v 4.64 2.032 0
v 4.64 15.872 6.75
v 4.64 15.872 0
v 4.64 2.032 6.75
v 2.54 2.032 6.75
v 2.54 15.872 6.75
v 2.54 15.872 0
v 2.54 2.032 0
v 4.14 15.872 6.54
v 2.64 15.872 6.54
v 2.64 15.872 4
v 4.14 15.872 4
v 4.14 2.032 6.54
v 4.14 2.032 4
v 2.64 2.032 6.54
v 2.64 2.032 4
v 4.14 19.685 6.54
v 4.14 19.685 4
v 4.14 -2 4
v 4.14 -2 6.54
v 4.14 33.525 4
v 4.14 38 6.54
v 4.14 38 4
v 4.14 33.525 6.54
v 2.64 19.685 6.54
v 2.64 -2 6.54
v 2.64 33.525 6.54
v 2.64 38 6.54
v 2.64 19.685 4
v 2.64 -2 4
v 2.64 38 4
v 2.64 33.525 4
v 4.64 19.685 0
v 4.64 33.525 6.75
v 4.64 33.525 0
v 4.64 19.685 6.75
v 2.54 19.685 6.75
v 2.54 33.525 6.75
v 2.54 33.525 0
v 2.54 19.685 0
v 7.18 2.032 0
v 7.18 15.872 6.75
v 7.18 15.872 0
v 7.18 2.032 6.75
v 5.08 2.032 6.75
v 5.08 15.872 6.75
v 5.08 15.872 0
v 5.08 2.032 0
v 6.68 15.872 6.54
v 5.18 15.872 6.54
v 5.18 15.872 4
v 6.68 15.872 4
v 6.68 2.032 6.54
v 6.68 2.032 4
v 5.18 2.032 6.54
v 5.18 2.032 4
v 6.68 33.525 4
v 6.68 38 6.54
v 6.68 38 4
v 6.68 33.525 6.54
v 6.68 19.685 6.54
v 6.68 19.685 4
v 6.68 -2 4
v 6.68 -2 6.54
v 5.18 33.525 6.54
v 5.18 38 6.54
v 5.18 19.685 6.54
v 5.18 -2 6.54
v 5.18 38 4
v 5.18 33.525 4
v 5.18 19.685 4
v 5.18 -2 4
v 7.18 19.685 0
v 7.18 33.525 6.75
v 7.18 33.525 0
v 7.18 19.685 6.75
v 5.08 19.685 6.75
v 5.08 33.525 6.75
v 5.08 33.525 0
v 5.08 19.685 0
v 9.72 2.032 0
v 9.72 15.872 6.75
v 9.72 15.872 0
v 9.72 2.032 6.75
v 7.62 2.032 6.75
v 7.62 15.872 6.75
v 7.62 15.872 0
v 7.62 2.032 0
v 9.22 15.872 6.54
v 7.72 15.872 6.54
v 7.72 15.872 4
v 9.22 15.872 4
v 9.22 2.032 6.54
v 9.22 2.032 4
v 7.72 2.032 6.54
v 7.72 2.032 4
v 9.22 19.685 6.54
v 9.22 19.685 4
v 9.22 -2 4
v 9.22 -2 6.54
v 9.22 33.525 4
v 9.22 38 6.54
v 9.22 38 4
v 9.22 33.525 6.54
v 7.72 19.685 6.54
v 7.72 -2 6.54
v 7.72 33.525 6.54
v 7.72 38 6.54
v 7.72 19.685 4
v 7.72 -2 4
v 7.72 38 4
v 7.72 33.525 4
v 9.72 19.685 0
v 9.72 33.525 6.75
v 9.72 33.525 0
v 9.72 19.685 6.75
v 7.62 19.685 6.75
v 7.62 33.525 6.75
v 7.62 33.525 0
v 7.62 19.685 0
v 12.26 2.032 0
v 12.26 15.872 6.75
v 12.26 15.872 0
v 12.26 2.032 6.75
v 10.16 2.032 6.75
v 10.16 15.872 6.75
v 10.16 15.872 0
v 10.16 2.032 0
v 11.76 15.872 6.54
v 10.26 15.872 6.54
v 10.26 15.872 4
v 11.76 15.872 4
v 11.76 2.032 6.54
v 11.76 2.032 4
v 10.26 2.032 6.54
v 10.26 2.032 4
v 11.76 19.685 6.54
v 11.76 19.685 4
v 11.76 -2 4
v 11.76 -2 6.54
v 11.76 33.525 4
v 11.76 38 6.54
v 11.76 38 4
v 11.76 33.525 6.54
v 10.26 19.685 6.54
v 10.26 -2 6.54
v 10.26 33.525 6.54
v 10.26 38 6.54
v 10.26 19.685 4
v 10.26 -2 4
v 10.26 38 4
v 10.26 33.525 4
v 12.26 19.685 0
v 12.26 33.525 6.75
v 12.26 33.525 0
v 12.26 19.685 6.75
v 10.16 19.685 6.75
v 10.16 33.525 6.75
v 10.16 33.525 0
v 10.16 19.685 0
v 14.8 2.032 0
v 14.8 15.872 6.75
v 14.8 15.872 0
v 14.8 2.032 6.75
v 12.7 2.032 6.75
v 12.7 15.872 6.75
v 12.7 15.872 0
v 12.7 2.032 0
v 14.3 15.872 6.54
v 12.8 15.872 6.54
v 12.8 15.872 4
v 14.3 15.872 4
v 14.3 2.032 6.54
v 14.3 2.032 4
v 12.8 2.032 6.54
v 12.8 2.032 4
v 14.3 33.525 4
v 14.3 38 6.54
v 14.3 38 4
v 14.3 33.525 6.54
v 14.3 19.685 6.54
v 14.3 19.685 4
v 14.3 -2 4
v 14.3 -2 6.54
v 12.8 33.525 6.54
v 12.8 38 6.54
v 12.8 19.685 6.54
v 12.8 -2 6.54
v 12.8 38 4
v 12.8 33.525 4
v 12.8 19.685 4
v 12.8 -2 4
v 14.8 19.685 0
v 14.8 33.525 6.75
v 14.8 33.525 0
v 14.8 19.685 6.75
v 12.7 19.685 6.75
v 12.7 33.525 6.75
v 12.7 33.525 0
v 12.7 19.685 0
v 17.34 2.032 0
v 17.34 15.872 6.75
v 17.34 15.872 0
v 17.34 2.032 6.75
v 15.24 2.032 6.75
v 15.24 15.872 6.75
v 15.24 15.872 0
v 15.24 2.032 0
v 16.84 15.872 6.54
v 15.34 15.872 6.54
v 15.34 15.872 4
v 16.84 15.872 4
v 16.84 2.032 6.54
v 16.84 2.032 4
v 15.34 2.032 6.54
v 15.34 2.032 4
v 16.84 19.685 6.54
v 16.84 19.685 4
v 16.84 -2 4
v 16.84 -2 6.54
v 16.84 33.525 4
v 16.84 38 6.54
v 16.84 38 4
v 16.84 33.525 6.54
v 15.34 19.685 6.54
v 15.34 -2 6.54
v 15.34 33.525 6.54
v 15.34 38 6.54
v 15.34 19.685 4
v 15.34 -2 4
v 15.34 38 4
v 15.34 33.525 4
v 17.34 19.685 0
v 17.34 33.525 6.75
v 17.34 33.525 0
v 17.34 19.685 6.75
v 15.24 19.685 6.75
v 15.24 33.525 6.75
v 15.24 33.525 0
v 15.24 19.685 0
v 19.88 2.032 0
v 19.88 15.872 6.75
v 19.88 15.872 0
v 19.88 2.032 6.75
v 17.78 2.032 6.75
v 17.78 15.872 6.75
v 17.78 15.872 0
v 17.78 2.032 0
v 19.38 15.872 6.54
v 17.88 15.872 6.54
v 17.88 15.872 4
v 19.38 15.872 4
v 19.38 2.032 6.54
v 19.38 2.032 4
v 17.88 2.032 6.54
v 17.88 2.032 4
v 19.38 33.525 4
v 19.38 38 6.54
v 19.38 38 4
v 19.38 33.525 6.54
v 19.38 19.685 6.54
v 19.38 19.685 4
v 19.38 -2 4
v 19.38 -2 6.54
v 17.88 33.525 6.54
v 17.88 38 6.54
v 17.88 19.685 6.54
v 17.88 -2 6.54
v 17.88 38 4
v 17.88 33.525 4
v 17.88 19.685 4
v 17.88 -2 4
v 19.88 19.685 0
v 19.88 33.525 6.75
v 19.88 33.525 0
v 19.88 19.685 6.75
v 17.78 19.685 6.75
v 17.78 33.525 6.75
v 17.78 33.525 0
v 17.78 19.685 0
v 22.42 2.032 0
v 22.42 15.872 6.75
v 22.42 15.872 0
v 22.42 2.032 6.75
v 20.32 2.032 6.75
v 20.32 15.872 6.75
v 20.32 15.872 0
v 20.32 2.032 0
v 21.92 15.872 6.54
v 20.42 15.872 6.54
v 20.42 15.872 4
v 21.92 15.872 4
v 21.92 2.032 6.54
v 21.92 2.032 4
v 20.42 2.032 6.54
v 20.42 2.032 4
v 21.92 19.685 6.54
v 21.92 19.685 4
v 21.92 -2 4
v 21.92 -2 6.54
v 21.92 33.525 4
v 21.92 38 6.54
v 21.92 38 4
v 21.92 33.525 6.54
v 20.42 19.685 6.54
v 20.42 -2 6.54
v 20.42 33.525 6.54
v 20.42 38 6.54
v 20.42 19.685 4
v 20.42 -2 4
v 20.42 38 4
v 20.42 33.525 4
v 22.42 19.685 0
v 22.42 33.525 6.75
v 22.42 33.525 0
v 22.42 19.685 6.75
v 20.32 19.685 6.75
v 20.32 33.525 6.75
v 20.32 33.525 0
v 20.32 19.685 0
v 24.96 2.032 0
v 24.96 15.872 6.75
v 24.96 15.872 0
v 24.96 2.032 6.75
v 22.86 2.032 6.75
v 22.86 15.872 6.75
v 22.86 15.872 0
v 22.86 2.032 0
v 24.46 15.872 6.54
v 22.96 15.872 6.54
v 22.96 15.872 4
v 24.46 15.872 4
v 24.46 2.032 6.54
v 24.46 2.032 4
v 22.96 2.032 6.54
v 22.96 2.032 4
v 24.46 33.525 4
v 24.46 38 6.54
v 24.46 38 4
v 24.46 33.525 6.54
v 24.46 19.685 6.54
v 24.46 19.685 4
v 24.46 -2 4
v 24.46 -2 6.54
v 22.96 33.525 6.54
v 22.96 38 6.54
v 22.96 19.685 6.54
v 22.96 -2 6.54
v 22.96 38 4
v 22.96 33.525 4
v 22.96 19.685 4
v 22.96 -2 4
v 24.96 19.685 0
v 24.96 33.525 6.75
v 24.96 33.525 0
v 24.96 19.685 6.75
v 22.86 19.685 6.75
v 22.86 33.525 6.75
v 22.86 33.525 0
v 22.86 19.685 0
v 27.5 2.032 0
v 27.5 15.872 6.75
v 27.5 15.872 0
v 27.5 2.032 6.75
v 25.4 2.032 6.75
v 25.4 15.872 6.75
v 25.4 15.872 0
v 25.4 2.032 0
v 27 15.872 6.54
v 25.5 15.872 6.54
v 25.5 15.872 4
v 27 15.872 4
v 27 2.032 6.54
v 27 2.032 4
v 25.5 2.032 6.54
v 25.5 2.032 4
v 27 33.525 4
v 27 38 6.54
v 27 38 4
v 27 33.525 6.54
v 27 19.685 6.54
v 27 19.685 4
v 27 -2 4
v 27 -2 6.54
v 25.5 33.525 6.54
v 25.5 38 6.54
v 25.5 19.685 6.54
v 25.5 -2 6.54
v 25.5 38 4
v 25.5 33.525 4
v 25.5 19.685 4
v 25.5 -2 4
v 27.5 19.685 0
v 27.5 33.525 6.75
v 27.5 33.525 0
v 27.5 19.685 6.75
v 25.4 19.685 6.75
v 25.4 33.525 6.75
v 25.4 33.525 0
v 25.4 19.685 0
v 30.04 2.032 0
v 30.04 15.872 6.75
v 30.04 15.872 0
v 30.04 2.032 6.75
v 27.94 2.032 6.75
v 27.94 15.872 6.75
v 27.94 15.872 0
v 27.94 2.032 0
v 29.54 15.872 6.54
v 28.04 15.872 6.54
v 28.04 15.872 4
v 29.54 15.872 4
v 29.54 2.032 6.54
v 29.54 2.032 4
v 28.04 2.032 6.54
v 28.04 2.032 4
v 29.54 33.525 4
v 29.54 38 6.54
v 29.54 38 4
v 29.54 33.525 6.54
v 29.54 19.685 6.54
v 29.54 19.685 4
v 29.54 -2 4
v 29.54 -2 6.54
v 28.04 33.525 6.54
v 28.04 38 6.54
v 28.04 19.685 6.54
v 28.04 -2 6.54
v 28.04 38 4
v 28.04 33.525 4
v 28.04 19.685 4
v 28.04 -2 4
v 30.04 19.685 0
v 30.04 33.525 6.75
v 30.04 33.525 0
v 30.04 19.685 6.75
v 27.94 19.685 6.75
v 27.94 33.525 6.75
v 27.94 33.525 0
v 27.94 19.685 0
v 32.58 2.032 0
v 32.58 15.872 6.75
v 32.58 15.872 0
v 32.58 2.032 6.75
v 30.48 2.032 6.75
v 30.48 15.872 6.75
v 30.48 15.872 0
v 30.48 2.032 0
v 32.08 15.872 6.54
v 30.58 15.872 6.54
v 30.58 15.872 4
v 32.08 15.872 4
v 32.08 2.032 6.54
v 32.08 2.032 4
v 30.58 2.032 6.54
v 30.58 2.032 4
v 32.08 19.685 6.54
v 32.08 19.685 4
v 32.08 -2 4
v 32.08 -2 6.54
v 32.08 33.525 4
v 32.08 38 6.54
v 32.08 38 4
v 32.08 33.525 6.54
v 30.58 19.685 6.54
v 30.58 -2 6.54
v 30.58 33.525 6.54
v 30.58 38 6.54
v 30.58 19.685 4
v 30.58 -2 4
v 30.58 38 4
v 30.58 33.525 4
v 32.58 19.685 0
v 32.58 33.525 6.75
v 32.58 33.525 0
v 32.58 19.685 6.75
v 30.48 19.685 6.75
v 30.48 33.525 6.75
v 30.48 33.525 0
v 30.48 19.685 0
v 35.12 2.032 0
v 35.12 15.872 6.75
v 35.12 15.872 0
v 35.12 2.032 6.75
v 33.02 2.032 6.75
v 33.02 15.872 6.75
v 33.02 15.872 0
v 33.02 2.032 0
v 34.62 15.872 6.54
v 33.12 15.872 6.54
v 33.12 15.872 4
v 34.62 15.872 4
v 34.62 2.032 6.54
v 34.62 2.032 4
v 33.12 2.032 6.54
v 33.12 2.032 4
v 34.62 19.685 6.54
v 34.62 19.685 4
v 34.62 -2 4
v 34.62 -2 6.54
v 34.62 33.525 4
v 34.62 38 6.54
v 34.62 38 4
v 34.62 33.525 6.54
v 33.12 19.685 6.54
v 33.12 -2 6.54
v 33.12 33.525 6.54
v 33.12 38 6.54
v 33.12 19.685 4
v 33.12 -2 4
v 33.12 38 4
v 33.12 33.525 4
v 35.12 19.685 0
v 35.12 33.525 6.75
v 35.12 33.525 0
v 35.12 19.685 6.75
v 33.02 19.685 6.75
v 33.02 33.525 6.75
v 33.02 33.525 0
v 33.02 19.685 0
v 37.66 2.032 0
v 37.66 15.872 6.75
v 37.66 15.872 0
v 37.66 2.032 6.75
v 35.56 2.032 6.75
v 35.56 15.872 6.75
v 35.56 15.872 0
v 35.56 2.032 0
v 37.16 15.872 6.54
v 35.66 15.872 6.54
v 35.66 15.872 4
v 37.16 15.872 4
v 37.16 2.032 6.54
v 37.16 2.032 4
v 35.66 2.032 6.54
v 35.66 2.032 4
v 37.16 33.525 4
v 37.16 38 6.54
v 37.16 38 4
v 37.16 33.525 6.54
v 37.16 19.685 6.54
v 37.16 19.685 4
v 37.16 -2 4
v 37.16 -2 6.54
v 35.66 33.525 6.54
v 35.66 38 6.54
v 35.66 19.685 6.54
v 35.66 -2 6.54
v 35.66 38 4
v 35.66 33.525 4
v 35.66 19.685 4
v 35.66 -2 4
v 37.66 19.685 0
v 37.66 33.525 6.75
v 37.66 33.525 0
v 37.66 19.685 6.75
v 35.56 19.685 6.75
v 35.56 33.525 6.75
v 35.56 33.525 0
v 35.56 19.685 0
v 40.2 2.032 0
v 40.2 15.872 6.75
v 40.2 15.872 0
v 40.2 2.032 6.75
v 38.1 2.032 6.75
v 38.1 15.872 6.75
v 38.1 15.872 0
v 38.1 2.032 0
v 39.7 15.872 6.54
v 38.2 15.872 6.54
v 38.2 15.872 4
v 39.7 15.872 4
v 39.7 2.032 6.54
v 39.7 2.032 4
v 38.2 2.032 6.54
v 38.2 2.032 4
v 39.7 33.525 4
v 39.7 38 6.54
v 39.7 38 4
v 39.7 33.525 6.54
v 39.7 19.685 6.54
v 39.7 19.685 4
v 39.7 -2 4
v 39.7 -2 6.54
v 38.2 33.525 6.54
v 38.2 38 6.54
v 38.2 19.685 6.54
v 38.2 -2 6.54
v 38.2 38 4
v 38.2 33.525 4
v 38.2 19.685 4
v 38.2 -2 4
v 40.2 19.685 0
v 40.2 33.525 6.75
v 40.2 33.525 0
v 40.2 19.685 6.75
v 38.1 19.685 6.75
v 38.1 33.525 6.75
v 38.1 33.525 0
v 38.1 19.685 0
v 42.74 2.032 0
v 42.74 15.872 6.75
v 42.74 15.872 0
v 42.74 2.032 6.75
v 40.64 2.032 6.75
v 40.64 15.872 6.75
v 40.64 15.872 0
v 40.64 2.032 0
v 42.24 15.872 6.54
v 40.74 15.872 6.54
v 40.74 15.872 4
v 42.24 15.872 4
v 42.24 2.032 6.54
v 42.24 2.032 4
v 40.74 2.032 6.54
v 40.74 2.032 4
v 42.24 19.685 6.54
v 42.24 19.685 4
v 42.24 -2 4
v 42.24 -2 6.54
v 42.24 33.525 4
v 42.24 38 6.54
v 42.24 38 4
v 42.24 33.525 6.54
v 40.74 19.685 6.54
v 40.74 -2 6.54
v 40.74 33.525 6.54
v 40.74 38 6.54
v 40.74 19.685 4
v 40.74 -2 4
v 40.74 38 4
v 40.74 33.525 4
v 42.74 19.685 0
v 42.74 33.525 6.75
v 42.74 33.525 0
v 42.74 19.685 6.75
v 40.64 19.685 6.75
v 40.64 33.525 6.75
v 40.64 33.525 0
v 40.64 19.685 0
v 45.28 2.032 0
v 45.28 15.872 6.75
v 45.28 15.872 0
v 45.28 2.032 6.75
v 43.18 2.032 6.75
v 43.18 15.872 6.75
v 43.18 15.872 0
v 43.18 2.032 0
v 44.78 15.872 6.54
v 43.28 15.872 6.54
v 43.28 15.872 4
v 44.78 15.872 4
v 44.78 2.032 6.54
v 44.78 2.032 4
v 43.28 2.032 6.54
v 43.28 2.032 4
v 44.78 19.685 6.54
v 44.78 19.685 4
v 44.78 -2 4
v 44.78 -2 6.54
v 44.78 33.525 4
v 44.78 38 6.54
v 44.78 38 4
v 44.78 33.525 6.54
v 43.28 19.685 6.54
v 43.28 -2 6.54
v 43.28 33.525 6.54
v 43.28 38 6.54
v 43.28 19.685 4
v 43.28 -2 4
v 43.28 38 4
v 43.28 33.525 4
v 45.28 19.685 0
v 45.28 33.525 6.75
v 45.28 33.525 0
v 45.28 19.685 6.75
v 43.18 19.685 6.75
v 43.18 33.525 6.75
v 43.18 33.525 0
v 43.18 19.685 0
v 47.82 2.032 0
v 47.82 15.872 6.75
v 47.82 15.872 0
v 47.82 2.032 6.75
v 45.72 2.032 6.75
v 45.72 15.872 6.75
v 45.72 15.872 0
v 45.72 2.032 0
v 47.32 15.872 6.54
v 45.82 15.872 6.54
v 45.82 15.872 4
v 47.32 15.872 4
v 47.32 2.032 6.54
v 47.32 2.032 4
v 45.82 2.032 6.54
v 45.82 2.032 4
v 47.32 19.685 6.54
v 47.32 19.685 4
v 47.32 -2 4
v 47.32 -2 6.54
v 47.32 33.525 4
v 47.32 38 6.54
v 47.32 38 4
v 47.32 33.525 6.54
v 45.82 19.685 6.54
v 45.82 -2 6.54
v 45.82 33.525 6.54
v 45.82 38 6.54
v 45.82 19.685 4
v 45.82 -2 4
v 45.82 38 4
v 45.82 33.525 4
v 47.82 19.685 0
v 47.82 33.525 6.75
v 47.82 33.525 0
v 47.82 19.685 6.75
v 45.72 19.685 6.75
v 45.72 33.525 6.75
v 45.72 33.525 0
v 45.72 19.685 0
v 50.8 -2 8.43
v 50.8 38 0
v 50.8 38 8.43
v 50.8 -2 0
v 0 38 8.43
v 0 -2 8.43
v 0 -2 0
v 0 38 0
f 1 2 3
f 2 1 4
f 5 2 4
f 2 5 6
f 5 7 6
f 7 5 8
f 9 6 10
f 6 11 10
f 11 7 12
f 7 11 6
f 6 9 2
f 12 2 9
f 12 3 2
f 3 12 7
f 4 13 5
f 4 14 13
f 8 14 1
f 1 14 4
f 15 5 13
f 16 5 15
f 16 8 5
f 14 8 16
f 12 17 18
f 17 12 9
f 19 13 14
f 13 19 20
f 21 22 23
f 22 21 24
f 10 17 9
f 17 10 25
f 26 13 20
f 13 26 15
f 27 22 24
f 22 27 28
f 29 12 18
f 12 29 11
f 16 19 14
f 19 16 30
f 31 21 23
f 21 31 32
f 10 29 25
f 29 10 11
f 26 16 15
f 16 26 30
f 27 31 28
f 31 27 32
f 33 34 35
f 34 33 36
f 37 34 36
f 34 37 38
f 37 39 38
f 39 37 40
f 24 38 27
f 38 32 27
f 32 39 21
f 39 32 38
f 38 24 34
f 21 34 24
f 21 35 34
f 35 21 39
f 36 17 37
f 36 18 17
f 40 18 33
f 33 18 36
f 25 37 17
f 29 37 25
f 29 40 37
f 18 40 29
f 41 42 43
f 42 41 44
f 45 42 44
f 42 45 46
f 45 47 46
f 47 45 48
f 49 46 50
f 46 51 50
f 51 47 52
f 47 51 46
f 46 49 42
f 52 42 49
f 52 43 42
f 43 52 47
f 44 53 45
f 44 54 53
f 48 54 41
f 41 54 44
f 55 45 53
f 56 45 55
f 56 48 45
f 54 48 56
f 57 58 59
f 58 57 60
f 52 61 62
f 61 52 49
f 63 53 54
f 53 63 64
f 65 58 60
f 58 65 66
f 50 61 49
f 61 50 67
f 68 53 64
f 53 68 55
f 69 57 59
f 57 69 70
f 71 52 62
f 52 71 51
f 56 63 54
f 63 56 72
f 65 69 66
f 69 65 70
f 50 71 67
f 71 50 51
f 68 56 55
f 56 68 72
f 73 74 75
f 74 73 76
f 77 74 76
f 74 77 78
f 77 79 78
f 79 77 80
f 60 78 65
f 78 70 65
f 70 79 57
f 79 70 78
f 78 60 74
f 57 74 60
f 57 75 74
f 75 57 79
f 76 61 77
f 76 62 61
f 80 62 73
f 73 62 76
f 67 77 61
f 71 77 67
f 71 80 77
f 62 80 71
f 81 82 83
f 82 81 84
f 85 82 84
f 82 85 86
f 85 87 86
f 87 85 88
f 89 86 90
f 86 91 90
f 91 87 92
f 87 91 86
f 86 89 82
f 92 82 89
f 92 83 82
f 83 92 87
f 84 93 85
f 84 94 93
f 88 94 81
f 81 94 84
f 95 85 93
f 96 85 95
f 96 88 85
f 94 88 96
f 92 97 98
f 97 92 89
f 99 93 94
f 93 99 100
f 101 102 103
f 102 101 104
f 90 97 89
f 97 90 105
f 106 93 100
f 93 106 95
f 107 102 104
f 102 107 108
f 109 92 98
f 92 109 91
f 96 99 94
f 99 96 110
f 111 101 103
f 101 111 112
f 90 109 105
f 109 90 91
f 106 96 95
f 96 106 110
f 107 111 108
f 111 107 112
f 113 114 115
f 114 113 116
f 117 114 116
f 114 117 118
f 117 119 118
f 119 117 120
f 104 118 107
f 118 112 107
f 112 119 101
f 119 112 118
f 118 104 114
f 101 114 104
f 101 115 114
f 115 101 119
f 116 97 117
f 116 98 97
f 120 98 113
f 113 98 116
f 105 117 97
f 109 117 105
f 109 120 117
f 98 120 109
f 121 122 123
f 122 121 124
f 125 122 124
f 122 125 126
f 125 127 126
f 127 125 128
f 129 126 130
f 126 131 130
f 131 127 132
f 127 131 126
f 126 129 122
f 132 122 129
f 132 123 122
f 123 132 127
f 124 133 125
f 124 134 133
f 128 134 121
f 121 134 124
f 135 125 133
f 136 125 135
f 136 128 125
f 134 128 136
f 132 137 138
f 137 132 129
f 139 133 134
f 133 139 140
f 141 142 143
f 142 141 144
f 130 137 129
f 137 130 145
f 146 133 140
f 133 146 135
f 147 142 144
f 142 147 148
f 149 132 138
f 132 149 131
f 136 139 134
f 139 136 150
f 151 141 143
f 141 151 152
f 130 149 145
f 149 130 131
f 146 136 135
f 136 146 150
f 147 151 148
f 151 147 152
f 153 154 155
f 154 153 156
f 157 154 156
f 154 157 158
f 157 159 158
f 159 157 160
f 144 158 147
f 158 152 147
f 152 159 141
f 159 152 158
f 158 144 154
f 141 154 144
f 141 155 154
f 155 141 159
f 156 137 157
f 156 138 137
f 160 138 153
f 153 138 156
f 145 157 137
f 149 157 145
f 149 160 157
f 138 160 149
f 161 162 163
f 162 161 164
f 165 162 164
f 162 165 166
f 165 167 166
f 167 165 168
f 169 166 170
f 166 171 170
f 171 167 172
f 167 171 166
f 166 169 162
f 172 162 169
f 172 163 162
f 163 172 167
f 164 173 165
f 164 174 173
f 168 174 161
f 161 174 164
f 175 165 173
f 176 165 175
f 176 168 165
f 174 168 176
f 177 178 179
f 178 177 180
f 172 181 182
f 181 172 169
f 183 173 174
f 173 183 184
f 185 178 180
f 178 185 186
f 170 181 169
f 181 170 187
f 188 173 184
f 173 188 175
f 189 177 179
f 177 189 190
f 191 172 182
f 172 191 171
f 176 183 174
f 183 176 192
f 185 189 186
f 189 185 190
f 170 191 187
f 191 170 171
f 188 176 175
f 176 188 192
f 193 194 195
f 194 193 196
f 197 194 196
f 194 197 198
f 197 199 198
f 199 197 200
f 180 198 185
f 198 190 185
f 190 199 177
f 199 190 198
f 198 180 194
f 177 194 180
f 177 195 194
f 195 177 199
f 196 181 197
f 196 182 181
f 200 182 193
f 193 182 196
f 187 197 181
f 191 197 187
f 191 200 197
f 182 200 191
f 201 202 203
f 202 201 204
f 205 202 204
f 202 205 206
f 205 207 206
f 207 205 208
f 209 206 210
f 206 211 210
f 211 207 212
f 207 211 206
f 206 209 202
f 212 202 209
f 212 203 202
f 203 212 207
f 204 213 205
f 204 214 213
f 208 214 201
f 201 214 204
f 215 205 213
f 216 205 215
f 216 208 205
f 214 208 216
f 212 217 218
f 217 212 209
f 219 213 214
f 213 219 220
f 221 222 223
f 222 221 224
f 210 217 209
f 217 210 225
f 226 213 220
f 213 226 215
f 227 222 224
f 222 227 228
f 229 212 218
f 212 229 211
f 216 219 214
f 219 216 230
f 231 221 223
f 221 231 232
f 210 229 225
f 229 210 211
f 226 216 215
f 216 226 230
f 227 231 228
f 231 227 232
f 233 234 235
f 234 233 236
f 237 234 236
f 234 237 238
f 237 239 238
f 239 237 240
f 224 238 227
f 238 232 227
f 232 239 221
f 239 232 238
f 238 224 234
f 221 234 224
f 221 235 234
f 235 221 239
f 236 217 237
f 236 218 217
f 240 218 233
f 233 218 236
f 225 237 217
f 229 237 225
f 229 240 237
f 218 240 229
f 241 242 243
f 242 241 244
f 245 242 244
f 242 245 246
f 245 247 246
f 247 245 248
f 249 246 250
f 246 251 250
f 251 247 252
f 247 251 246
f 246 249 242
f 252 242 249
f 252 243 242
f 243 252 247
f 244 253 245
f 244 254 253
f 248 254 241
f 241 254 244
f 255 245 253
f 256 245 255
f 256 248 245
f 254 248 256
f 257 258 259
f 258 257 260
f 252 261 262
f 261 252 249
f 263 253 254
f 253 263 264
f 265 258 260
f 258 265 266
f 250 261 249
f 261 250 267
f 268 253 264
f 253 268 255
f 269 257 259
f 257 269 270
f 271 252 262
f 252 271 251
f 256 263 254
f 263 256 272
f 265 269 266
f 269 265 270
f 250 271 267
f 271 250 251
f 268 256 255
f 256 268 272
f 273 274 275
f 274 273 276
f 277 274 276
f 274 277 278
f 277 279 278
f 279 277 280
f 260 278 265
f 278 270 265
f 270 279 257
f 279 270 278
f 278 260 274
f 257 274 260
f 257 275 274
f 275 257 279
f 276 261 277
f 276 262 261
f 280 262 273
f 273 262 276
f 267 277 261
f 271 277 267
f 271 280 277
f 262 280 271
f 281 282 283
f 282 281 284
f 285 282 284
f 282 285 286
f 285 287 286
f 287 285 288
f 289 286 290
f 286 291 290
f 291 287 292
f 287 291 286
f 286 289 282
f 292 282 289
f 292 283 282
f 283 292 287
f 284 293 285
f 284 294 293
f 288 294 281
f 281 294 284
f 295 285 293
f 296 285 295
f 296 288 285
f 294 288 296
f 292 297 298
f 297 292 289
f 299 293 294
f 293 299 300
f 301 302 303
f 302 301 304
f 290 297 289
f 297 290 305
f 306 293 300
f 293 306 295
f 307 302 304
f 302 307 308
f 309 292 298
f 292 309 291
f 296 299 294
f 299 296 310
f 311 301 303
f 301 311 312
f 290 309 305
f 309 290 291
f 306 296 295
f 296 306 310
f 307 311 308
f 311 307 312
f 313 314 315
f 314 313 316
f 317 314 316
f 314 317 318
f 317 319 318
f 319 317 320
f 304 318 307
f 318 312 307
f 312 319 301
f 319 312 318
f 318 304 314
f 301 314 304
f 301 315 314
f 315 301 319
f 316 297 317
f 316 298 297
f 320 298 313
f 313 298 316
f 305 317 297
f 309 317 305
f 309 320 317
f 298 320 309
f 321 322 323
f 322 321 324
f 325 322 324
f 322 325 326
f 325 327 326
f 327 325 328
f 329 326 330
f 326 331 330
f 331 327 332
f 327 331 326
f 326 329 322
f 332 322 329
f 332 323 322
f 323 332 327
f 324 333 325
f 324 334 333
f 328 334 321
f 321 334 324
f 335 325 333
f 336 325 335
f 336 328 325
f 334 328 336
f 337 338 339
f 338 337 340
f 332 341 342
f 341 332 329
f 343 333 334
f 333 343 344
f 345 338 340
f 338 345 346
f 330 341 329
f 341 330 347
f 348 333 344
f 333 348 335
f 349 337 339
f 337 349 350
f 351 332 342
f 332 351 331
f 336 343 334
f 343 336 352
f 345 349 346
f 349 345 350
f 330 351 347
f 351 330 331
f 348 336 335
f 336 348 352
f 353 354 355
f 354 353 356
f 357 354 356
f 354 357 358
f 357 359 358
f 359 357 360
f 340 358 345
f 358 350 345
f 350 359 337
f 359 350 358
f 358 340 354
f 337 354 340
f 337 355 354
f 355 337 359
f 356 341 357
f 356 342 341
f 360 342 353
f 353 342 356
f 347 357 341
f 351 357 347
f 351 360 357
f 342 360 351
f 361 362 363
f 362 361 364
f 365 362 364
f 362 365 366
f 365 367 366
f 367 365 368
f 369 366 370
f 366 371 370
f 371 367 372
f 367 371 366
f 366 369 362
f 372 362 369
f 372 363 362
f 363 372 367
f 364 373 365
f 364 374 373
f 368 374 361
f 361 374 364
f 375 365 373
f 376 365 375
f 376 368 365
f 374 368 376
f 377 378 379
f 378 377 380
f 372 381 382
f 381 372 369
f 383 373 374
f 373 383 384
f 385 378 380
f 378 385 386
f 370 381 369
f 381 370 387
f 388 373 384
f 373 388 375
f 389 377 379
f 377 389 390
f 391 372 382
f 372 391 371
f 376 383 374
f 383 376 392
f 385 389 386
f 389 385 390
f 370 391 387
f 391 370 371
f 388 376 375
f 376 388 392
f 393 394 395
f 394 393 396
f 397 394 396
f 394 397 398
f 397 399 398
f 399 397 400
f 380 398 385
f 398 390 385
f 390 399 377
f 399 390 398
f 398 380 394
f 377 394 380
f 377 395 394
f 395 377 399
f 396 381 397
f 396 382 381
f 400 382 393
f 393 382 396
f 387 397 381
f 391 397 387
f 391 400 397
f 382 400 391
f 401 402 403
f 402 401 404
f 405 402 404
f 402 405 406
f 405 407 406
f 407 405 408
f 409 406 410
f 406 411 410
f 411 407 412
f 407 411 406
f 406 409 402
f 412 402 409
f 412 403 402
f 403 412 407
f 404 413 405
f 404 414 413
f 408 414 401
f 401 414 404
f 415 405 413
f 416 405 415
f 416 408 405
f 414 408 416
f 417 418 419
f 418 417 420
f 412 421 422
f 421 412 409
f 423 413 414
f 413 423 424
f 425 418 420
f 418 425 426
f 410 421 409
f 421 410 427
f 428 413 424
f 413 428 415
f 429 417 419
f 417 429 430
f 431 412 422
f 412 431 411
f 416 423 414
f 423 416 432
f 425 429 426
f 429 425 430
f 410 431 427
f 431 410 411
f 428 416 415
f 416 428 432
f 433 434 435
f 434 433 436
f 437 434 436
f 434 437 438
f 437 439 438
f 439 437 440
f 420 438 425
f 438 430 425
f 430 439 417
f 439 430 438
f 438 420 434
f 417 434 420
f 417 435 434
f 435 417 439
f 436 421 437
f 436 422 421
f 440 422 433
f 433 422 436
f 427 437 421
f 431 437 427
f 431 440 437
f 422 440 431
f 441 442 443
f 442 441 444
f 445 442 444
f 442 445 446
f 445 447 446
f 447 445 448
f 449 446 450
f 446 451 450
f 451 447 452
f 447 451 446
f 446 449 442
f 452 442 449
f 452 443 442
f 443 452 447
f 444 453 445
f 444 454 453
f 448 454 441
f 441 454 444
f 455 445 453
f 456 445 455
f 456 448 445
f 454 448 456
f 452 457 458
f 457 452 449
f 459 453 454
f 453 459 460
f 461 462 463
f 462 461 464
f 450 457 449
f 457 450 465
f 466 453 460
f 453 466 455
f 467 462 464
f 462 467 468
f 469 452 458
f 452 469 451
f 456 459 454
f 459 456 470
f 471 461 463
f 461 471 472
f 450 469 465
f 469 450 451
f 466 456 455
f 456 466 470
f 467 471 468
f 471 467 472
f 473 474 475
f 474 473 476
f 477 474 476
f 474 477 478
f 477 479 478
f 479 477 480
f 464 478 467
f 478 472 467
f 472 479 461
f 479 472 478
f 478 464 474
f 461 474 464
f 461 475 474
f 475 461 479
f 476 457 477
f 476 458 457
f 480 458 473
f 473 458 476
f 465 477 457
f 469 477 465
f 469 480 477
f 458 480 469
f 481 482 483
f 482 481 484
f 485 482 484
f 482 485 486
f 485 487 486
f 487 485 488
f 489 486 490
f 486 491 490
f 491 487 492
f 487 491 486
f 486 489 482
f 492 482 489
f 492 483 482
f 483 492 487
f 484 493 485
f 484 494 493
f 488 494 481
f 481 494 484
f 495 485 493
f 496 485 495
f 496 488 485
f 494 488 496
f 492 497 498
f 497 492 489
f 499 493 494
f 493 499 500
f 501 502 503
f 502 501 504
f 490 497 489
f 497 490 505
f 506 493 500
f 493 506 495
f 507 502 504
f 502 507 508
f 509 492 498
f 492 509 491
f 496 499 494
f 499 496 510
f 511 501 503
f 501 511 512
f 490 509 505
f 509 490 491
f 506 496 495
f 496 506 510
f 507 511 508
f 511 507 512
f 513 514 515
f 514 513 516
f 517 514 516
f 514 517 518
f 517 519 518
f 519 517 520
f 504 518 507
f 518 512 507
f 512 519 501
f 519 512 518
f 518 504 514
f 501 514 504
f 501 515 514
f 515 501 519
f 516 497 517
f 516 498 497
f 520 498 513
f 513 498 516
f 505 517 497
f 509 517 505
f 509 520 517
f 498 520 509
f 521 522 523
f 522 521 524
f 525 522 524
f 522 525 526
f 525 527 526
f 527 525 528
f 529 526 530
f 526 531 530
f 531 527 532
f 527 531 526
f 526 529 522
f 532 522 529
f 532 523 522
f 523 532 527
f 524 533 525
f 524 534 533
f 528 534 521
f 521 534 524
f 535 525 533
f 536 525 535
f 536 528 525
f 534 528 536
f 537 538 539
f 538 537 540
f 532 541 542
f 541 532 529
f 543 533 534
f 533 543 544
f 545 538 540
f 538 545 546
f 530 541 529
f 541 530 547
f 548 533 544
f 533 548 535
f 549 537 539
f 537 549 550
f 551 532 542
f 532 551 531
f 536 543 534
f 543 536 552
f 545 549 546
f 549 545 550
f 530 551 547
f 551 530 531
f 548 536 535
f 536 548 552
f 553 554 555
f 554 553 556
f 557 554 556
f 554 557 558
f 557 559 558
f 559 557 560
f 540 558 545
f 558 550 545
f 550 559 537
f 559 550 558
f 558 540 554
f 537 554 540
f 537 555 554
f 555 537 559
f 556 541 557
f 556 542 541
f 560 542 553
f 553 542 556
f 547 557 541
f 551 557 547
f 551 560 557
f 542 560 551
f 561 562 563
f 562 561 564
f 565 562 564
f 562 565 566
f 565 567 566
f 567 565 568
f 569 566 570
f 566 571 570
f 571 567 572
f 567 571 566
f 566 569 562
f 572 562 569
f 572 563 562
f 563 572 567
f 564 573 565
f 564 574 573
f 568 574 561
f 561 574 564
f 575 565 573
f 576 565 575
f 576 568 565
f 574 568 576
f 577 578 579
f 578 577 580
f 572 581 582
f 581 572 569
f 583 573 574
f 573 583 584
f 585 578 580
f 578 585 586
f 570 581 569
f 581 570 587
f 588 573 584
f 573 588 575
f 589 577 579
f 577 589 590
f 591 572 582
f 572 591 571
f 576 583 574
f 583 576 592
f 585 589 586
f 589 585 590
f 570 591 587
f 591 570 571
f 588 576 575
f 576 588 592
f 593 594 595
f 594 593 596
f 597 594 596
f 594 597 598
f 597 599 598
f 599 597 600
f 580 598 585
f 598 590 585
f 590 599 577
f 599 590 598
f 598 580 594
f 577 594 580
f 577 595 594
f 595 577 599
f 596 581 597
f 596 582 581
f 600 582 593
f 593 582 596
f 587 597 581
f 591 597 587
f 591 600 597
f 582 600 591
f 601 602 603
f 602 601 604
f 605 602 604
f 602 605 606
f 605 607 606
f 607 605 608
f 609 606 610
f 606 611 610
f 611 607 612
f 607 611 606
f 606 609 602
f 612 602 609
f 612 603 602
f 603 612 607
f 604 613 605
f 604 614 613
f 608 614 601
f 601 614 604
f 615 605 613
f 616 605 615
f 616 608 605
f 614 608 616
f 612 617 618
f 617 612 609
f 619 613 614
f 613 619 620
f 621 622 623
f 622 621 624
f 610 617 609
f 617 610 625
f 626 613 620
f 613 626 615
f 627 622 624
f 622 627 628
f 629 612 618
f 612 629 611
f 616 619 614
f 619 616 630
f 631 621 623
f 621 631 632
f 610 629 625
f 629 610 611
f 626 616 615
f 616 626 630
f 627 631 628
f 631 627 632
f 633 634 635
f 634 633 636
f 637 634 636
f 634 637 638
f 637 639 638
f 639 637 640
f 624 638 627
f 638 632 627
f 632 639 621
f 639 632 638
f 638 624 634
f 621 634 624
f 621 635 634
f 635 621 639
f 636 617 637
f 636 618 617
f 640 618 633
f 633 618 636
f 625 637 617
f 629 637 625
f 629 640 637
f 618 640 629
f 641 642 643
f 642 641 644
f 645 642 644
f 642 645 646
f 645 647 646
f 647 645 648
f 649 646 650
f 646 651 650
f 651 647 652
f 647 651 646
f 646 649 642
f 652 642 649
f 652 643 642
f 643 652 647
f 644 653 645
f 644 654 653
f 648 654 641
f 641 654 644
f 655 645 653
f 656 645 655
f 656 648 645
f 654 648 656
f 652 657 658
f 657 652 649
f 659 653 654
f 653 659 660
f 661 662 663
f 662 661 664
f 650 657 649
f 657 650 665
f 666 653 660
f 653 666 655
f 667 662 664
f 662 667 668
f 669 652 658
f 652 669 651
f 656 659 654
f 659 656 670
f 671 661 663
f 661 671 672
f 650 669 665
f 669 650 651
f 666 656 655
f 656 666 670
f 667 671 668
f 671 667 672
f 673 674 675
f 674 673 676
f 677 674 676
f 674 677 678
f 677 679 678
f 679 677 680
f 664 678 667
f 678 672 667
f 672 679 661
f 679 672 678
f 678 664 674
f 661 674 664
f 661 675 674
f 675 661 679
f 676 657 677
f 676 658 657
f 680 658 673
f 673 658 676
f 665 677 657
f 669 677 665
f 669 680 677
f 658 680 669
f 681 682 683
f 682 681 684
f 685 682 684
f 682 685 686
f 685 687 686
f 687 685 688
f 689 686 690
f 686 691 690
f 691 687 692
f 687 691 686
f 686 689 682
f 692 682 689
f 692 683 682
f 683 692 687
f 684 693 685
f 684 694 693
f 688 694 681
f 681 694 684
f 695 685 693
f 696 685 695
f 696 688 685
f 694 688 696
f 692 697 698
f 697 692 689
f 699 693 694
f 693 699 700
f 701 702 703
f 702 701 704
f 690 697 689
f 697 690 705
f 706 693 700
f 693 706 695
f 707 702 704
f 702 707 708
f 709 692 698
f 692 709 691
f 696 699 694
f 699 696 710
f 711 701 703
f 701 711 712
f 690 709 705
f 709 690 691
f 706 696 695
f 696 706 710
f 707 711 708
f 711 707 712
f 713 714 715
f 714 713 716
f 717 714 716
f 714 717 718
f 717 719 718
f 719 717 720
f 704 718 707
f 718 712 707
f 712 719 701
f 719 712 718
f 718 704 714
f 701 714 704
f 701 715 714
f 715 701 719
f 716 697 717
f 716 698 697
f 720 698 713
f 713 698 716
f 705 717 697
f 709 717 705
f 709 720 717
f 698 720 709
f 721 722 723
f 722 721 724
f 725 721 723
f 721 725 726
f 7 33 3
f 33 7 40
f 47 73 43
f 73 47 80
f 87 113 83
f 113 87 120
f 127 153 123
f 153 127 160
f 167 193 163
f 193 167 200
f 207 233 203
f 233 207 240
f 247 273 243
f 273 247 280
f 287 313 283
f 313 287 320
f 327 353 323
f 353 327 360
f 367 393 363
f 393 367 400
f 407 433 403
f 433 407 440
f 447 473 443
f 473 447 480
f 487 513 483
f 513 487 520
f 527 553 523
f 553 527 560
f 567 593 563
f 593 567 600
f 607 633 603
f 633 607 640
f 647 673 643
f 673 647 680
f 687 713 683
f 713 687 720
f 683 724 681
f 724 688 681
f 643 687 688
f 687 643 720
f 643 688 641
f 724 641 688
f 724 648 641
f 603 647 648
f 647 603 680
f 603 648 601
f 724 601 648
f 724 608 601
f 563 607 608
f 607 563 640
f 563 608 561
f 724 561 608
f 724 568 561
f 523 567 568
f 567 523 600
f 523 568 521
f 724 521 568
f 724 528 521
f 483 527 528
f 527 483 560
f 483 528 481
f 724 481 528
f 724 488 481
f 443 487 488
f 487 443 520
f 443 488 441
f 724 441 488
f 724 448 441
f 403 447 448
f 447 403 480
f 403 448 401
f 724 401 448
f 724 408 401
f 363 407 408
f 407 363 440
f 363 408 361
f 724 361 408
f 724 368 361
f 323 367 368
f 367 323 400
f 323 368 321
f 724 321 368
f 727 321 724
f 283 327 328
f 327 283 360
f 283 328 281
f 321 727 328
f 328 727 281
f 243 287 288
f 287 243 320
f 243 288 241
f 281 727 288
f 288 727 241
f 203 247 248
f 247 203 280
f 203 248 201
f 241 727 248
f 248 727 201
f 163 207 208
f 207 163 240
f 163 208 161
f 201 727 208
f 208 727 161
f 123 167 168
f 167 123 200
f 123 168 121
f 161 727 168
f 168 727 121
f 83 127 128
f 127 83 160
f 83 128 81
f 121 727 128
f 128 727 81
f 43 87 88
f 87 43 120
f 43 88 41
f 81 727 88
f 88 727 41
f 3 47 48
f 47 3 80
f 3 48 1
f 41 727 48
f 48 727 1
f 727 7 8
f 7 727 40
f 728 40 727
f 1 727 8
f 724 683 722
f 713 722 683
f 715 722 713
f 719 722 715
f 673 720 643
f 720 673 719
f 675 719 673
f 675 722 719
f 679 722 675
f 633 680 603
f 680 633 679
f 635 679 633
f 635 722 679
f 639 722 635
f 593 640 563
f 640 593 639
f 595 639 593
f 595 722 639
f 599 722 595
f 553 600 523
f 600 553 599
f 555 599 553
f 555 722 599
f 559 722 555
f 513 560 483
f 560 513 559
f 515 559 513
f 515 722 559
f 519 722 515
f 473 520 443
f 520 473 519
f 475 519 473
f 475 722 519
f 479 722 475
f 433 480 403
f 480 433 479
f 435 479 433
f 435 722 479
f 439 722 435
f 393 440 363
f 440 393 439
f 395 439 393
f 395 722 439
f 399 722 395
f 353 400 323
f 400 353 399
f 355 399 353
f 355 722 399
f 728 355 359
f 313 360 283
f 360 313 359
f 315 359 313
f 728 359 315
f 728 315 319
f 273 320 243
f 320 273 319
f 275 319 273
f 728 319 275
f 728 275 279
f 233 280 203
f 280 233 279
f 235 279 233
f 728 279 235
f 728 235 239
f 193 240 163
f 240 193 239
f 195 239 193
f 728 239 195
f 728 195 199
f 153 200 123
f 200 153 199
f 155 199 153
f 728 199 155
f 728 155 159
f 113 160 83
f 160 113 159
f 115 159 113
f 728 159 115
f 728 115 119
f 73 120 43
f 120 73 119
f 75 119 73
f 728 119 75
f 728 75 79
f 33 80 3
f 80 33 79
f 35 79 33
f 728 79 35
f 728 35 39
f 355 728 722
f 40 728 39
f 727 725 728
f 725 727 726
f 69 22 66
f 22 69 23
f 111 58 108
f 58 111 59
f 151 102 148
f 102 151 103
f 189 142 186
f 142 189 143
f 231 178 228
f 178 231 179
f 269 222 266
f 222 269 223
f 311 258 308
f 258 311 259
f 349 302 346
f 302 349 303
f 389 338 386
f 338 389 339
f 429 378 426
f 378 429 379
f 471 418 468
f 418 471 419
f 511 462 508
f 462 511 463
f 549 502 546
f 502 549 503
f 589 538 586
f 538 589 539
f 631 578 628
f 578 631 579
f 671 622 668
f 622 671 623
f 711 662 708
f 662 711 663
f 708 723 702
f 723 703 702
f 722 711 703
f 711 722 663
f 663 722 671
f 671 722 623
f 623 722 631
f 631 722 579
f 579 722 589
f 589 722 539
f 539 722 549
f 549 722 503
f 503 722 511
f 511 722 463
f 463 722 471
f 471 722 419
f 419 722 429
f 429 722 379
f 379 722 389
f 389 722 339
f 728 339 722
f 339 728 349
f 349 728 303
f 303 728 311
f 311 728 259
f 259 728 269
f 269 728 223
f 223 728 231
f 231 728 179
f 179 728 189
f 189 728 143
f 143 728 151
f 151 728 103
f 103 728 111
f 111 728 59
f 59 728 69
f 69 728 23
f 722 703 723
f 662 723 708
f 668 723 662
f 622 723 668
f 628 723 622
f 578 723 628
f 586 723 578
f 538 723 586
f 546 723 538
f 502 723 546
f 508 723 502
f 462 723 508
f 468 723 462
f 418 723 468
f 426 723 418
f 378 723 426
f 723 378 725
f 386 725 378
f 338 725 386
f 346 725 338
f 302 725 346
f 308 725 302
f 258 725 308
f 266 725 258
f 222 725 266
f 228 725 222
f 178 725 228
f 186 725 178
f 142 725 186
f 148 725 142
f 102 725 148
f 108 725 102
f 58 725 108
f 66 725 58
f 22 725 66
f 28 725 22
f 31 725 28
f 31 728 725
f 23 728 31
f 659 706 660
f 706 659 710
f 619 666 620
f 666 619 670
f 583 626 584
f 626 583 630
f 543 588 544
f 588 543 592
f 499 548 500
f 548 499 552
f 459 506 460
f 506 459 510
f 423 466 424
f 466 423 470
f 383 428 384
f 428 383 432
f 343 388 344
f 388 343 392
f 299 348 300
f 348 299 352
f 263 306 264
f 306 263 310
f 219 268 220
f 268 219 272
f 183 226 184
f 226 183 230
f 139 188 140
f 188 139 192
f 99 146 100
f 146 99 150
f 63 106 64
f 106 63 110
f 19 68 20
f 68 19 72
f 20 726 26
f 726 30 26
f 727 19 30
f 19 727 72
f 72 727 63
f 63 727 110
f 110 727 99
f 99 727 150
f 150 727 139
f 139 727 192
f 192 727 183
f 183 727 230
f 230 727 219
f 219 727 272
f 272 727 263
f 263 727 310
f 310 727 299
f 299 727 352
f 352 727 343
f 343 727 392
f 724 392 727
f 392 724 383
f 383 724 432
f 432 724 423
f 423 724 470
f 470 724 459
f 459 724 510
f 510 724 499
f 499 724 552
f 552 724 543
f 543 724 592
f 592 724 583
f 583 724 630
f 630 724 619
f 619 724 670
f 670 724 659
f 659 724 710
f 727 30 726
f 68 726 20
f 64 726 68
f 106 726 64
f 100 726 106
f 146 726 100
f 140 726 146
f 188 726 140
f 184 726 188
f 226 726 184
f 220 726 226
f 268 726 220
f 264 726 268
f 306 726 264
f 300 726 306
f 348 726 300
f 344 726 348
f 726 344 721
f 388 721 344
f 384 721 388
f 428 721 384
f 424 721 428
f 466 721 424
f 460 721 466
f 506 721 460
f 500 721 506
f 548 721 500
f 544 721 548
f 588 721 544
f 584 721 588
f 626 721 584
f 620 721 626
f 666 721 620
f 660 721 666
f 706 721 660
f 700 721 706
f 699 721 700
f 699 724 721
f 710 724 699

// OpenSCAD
difference(){
translate([0,-2,0])
cube([50.8,40,8.43]);
for(z=[1:18]){
translate([2.54*z,2.032,-.01])
cube([2.1,13.84,6.76]);
translate([2.54*z+.1,-20.32,4])
cube([1.5,60,2.54]);
translate([2.54*z,19.685,-.01])
cube([2.1,13.84,6.76]);
}
}
